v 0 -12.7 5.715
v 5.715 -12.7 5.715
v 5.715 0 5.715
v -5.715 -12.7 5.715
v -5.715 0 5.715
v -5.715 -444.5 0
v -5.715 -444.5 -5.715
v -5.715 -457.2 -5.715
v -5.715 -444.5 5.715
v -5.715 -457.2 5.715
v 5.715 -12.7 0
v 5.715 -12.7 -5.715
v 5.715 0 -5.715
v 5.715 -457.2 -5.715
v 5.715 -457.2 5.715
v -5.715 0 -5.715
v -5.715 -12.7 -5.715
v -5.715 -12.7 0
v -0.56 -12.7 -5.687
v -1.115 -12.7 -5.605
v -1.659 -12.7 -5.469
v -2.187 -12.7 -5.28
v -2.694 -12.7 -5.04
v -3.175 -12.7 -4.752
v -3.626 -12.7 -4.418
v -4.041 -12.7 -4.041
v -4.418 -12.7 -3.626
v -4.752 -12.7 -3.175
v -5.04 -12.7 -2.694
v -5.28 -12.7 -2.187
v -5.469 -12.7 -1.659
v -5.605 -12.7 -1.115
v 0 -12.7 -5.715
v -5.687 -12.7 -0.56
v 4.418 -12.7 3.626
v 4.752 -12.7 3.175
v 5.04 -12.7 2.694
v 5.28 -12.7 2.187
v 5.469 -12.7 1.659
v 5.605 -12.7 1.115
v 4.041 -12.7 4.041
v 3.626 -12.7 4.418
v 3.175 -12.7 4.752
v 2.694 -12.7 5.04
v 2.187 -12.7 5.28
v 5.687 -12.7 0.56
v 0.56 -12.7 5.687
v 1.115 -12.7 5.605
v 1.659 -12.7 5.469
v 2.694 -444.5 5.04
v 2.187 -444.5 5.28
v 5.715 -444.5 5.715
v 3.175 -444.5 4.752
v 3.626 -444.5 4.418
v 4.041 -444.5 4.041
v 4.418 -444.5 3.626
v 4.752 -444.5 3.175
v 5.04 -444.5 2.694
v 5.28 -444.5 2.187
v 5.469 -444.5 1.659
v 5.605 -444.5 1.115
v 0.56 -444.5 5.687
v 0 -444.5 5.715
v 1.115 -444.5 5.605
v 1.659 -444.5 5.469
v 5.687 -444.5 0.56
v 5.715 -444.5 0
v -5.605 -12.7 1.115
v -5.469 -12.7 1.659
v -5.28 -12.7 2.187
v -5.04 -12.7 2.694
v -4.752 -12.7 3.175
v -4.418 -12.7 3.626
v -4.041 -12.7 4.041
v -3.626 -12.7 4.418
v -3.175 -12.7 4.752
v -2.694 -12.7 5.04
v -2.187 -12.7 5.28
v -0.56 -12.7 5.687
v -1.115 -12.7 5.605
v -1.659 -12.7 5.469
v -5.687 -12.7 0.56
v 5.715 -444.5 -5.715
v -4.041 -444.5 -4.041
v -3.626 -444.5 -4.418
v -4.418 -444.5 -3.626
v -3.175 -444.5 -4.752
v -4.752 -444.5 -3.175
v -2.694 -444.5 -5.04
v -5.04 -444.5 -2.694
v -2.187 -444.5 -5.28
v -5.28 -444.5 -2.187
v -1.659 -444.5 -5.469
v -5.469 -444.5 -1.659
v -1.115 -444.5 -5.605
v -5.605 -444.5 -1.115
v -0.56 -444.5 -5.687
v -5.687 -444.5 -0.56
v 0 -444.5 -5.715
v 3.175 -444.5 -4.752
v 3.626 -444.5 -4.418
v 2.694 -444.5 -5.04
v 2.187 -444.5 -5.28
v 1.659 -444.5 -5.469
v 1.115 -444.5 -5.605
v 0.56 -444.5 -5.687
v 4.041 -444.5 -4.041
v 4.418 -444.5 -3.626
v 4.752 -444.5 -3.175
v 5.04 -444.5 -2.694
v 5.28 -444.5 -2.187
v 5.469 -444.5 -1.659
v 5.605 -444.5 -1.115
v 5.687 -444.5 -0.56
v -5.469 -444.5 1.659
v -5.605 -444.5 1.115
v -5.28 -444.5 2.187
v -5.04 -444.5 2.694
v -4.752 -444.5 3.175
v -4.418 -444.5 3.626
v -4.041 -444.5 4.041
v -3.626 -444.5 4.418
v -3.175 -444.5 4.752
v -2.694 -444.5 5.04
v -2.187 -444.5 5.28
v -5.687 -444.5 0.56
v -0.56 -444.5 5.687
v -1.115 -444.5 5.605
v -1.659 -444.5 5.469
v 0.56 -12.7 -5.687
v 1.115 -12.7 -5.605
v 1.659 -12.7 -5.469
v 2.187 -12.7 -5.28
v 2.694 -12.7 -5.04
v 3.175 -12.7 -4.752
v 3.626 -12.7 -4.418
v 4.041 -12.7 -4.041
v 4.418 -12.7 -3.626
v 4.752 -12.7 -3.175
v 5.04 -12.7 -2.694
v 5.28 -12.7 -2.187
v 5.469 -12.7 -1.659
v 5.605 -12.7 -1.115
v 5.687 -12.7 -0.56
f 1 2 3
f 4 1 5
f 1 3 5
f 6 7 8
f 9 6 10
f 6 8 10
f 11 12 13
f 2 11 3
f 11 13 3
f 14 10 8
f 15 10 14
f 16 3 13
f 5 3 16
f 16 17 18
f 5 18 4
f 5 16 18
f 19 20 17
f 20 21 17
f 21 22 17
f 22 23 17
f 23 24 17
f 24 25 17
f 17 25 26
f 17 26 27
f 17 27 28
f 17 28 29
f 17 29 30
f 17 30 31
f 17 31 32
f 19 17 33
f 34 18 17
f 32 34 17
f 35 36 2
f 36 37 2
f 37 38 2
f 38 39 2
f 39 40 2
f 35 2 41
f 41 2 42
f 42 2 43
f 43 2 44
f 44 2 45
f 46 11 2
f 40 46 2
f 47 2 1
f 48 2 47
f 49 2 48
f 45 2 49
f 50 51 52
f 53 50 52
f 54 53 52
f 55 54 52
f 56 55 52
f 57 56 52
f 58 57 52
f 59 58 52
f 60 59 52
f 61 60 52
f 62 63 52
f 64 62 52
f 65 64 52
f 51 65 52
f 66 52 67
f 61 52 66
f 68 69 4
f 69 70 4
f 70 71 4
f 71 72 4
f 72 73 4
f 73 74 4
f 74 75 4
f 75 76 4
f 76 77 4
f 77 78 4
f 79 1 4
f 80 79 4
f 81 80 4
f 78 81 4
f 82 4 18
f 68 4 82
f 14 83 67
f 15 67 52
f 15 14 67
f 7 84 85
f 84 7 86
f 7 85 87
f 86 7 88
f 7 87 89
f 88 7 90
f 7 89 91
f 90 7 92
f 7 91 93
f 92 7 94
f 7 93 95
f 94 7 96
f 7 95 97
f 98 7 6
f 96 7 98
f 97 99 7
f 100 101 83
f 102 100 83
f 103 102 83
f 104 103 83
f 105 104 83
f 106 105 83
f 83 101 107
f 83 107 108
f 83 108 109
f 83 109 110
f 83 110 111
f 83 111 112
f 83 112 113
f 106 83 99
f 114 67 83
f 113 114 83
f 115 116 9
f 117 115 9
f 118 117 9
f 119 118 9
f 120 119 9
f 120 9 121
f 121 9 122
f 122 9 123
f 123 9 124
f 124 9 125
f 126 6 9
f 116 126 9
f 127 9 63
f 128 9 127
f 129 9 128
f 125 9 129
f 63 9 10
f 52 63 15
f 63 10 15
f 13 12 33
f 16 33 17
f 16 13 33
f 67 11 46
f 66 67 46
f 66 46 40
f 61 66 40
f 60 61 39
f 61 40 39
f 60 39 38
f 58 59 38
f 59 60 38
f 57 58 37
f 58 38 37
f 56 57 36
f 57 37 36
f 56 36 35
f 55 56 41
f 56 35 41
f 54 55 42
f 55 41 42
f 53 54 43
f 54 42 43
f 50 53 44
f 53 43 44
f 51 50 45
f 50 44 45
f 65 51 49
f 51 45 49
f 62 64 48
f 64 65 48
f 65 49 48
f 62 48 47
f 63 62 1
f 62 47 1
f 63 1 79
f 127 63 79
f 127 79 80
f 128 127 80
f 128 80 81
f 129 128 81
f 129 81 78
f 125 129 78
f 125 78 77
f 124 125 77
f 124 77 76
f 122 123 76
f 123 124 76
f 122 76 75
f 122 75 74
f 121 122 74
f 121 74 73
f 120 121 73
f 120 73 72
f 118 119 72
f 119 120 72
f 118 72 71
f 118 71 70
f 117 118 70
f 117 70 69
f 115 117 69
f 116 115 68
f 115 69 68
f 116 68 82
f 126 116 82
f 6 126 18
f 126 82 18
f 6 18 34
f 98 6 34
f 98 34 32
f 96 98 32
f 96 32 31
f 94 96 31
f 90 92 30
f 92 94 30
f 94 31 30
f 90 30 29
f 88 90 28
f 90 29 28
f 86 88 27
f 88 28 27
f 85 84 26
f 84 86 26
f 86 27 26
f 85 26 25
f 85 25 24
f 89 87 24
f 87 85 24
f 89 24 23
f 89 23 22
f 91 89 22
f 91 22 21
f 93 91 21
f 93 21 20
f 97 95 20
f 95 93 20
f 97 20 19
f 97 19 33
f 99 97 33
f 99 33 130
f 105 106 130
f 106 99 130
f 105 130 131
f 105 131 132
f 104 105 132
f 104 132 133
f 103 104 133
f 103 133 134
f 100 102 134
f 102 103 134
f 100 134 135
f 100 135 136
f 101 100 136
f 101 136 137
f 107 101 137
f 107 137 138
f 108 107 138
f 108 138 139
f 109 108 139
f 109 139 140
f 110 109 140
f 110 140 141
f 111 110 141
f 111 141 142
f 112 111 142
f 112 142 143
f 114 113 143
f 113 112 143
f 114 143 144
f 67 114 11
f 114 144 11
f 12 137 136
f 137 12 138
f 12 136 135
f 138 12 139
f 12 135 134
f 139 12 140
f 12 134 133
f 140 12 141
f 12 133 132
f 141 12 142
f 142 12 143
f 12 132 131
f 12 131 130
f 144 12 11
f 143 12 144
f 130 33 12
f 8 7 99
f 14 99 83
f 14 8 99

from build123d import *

# Parameters (mm, degrees)
F0_R     = 5.715
F1_DEPTH = 457.2
F2_W     = 11.43
F2_H     = 11.43
F3_DEPTH = 12.7
F4_W     = 11.43
F4_H     = 11.43
F5_DEPTH = 12.7


with BuildPart() as f1:
    # F0 (on Front) → F1 (new body)
    with BuildSketch(Plane.XZ):
        Circle(F0_R)
    extrude(amount=F1_DEPTH)

    # F2 (on face) → F3 (join)
    with BuildSketch(Plane(origin=(0, 0, 0), x_dir=(-1, 0, 0), z_dir=(0, 1, 0))):
        Rectangle(F2_W, F2_H)
    extrude(amount=-F3_DEPTH)

    # F4 (on face) → F5 (join)
    with BuildSketch(Plane.XZ.offset(457.2)):
        Rectangle(F4_W, F4_H)
    extrude(amount=-F5_DEPTH)


solid = f1.part
